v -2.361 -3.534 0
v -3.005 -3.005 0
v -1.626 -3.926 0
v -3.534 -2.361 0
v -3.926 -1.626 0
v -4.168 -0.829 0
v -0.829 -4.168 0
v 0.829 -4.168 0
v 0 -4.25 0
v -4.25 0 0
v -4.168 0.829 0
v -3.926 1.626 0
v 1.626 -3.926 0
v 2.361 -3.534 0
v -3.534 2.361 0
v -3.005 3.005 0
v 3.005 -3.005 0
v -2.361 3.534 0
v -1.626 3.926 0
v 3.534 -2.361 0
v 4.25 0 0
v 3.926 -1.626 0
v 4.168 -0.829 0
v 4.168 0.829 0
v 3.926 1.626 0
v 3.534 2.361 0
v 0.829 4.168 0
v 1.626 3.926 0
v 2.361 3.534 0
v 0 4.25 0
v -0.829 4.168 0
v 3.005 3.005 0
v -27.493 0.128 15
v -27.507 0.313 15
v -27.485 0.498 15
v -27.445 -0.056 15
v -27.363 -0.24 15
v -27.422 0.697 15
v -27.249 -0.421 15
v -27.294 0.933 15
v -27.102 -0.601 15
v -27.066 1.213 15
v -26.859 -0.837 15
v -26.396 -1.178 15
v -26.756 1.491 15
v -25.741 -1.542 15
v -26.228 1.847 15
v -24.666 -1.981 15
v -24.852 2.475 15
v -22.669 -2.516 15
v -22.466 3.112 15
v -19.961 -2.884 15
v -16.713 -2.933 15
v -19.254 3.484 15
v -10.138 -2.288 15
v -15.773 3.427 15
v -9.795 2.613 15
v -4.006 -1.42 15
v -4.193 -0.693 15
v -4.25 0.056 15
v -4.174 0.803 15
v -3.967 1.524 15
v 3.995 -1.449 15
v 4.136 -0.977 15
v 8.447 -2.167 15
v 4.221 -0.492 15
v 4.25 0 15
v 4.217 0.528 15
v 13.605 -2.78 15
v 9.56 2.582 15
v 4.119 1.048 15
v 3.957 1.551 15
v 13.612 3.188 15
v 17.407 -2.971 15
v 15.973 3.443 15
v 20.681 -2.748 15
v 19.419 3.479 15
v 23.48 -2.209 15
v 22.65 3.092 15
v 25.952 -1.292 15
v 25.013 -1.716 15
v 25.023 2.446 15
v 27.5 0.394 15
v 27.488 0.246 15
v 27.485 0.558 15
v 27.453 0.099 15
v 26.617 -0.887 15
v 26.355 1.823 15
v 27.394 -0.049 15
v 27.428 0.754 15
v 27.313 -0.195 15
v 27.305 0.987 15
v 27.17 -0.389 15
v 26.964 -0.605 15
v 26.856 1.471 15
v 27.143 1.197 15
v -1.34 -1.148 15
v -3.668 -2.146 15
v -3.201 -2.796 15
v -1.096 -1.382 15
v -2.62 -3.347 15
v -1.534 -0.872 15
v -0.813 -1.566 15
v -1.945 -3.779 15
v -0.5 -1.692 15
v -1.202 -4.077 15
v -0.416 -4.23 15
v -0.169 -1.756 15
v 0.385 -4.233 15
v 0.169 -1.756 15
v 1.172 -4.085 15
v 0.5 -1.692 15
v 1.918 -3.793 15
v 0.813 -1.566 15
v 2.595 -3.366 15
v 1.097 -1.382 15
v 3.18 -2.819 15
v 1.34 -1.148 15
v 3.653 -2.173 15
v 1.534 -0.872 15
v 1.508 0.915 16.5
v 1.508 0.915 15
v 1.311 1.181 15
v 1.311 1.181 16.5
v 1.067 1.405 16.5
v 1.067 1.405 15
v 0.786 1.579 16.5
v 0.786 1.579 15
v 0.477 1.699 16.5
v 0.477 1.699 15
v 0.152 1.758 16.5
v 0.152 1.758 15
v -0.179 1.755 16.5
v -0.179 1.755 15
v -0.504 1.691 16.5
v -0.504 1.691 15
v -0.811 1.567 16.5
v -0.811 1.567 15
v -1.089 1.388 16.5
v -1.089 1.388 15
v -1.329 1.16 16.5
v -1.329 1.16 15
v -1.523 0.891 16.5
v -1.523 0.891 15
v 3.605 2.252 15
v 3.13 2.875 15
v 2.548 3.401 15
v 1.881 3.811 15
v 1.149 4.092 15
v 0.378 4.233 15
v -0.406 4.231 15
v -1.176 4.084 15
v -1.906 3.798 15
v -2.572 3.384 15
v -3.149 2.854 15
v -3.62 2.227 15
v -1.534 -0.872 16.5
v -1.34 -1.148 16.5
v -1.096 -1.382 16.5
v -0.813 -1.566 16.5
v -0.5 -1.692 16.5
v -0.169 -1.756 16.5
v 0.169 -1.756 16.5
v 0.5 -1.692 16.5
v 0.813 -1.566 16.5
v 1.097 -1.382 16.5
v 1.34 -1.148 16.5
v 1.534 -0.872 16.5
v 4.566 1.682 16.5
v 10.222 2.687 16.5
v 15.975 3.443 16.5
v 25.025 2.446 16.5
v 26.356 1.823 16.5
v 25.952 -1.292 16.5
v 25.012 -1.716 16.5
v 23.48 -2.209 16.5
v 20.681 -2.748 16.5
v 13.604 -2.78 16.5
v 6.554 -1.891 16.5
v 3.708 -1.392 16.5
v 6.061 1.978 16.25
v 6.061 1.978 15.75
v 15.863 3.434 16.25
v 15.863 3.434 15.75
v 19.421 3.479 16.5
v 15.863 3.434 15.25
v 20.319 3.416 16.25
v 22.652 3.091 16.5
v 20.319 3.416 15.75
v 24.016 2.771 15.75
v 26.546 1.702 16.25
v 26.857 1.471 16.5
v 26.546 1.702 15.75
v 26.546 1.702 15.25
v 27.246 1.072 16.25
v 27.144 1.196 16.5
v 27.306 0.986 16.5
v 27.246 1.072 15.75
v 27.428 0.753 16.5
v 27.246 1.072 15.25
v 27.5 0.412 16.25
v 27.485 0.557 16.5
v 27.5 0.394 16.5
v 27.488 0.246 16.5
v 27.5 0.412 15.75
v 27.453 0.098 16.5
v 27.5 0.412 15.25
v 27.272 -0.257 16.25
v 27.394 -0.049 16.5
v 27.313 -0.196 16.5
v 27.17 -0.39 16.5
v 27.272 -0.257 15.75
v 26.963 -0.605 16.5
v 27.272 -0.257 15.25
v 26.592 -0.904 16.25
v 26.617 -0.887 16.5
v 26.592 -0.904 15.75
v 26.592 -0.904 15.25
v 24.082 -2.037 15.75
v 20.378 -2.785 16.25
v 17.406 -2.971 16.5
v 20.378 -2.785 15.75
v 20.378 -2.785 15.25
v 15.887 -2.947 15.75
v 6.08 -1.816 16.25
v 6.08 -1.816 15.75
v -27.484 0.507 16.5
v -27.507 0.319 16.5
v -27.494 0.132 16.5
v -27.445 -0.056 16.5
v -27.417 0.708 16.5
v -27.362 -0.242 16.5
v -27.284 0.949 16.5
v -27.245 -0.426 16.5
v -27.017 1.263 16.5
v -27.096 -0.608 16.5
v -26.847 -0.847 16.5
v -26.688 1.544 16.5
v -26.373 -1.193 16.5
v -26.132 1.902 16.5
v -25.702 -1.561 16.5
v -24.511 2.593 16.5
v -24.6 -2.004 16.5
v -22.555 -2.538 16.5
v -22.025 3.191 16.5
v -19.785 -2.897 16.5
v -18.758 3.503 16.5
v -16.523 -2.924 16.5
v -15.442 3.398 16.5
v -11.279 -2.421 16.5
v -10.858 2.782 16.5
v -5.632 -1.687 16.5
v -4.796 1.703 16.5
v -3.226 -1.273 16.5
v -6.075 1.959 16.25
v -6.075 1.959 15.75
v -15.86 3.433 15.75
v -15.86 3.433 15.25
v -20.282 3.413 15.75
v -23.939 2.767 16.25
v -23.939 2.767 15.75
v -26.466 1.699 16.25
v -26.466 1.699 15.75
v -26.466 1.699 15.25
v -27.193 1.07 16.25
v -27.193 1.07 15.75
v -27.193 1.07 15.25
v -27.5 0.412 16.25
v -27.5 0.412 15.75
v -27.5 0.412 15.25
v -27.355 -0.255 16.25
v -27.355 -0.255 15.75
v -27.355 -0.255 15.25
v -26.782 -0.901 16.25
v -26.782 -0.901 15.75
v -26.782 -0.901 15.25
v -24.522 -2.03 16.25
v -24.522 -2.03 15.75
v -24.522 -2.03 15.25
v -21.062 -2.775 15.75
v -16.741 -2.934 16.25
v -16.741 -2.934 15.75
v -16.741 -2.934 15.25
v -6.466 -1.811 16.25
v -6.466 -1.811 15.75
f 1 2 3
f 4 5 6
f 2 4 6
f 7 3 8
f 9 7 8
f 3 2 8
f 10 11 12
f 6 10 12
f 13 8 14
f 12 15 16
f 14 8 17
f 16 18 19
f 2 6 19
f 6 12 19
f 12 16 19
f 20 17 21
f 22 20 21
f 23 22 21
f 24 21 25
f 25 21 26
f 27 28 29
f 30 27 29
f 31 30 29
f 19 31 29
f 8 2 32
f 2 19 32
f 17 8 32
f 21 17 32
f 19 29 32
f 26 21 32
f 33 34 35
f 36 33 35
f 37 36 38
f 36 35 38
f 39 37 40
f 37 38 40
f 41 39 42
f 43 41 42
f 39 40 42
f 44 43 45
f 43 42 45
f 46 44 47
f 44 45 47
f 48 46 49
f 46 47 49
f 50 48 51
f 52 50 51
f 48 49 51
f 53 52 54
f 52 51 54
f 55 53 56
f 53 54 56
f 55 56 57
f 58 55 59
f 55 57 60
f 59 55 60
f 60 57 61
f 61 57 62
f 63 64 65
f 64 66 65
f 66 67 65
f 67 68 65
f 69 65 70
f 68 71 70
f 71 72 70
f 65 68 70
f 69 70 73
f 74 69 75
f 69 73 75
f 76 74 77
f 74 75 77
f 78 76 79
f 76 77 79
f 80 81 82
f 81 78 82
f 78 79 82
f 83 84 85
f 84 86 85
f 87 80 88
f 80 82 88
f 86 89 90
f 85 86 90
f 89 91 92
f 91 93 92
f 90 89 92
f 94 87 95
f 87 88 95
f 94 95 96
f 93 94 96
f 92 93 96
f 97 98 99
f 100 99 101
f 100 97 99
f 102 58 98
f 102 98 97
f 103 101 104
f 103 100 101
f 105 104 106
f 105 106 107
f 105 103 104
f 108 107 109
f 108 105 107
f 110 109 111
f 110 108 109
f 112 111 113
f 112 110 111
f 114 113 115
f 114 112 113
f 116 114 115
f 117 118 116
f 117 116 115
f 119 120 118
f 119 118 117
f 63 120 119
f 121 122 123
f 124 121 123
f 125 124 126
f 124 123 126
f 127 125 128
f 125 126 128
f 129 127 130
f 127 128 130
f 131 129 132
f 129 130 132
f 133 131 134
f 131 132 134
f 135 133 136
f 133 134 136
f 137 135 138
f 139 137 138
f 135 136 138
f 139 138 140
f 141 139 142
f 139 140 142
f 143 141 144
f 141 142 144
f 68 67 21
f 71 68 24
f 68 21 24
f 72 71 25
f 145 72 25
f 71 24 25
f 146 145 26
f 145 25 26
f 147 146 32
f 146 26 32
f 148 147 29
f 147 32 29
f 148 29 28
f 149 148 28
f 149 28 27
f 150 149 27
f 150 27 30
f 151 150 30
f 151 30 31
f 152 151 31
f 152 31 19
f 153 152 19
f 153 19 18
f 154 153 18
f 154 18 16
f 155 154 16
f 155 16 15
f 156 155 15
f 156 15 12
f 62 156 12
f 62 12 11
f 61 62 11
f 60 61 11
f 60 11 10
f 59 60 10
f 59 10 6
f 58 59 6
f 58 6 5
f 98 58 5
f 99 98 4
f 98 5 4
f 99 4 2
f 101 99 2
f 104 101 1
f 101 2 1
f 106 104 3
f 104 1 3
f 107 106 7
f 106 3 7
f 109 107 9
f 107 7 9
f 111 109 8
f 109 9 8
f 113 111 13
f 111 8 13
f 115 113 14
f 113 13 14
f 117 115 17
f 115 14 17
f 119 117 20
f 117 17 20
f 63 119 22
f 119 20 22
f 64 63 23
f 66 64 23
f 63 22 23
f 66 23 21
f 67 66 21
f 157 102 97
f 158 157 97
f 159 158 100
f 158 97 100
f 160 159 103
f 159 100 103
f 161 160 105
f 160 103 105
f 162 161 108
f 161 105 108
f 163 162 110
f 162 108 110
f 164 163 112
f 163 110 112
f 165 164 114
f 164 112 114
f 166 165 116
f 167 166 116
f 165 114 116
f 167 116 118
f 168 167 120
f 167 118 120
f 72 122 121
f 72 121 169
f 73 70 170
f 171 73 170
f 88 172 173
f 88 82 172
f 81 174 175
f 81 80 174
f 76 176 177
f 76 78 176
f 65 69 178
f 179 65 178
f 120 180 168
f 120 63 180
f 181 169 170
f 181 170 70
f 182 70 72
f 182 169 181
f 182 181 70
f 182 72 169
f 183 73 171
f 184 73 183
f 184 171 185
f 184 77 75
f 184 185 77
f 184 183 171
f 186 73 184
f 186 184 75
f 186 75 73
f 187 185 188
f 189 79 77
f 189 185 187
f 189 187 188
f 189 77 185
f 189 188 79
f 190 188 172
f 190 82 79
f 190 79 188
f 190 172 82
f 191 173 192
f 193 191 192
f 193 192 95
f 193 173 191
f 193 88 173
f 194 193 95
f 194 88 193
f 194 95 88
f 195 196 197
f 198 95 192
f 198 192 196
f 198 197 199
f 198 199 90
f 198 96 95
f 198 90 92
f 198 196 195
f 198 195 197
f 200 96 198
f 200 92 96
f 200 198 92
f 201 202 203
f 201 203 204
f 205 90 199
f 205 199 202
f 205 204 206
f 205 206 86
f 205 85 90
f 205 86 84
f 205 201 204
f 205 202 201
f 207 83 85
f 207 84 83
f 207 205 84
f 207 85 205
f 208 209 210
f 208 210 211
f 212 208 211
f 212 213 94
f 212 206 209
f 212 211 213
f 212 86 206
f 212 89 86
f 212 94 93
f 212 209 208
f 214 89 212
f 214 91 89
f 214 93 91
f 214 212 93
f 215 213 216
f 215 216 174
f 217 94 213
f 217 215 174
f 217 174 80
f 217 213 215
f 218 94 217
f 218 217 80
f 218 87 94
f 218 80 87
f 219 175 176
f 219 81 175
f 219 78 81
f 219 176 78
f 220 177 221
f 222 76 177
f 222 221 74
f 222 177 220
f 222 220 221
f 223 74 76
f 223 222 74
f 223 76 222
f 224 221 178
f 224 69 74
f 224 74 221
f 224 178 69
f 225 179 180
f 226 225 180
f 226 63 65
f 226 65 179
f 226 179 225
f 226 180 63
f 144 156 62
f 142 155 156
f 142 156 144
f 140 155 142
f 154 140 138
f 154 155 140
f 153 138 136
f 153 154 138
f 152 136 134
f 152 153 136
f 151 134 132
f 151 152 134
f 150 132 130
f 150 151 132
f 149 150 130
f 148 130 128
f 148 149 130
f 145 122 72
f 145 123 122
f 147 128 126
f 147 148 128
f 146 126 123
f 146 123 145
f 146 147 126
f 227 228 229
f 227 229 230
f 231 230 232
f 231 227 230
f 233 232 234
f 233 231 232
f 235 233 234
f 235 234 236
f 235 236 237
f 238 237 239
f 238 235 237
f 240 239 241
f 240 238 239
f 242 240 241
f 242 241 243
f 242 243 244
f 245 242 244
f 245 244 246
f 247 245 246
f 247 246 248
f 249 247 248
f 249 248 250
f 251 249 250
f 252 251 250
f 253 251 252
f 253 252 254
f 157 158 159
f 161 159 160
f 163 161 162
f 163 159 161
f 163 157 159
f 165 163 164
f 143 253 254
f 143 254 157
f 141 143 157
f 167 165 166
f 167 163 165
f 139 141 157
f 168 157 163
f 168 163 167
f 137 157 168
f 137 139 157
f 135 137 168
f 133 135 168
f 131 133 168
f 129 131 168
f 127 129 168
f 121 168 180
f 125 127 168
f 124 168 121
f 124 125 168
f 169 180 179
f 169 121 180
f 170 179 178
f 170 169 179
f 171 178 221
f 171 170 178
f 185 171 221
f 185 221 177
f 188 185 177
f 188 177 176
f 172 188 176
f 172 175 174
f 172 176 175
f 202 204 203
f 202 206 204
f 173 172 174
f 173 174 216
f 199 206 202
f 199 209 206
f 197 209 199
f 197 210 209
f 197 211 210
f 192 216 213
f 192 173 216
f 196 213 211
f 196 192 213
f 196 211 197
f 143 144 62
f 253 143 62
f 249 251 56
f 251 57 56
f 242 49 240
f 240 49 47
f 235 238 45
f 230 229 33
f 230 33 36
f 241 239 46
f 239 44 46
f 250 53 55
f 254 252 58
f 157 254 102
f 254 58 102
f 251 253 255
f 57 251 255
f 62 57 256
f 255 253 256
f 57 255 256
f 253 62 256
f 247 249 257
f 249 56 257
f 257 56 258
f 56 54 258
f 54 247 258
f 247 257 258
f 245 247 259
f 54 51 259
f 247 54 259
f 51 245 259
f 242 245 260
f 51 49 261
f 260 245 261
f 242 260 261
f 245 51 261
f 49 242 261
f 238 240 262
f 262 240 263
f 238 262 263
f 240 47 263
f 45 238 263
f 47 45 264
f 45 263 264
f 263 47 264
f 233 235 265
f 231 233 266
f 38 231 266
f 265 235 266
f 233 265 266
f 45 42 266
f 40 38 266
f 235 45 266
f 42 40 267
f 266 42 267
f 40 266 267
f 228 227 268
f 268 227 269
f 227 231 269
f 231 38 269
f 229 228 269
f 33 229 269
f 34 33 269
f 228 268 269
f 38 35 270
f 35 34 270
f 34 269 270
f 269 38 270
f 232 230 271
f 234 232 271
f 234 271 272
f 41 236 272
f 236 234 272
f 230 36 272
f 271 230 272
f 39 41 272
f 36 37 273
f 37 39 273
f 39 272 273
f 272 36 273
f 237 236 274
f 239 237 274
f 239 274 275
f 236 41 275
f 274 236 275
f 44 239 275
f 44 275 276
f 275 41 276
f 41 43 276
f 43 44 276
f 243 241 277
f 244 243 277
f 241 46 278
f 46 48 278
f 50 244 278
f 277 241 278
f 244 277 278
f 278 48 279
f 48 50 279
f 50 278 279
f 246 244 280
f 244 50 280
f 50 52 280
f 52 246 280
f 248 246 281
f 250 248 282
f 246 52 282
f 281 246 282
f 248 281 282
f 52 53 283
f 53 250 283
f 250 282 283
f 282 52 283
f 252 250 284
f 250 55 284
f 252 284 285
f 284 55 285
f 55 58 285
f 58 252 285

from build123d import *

# Parameters (mm, degrees)
SKETCH1_R           = 4.25
BOSS_EXTRUDE1_DEPTH = 15
BOSS_EXTRUDE2_DEPTH = 1.5


with BuildPart() as part:
    # Sketch1 → Boss-Extrude1 (new body)
    with BuildSketch(Plane.XY):
        Circle(SKETCH1_R)
    extrude(amount=BOSS_EXTRUDE1_DEPTH)

    # Sketch2 → Boss-Extrude2 (add)
    with BuildSketch(Plane.XY.offset(15)):
        with BuildLine():
            ThreePointArc((-1.533700981, -0.872101101), (0.000153071, -1.764312616), (1.533852284, -0.871834962))
            add(Edge.make_bspline(
                [(1.50837433, 0.915208125), (3.674043468, 1.615273216), (9.041308273, 2.555352687), (21.126434668, 4.242443839), (32.827619063, 0.448151773), (21.224545642, -3.554190079), (9.052186992, -2.328241324), (3.705331431, -1.518255924), (1.533852284, -0.871834962)],
                knots=[0.06989101, 0.06989101, 0.06989101, 0.06989101, 0.227812068, 0.270819598, 0.499966302, 0.730546414, 0.773598458, 0.930486743, 0.930486743, 0.930486743, 0.930486743], degree=3))
            ThreePointArc((1.50837433, 0.915208125), (-0.013837764, 1.764258356), (-1.522544538, 0.891435449))
            add(Edge.make_bspline(
                [(-1.522544538, 0.891435449), (-3.692002254, 1.57674274), (-9.054493456, 2.561553939), (-21.132416772, 4.237449152), (-32.489337553, 0.445121131), (-22.027907319, -3.542276517), (-10.001238176, -2.31393839), (-3.703611965, -1.518967575), (-1.533700981, -0.872101101)],
                knots=[0, 0, 0, 0, 0.157468993, 0.200426293, 0.429572998, 0.660153109, 0.703205382, 0.86009572, 0.86009572, 0.86009572, 0.86009572], degree=3))
        make_face()
    extrude(amount=BOSS_EXTRUDE2_DEPTH)


solid = part.part
